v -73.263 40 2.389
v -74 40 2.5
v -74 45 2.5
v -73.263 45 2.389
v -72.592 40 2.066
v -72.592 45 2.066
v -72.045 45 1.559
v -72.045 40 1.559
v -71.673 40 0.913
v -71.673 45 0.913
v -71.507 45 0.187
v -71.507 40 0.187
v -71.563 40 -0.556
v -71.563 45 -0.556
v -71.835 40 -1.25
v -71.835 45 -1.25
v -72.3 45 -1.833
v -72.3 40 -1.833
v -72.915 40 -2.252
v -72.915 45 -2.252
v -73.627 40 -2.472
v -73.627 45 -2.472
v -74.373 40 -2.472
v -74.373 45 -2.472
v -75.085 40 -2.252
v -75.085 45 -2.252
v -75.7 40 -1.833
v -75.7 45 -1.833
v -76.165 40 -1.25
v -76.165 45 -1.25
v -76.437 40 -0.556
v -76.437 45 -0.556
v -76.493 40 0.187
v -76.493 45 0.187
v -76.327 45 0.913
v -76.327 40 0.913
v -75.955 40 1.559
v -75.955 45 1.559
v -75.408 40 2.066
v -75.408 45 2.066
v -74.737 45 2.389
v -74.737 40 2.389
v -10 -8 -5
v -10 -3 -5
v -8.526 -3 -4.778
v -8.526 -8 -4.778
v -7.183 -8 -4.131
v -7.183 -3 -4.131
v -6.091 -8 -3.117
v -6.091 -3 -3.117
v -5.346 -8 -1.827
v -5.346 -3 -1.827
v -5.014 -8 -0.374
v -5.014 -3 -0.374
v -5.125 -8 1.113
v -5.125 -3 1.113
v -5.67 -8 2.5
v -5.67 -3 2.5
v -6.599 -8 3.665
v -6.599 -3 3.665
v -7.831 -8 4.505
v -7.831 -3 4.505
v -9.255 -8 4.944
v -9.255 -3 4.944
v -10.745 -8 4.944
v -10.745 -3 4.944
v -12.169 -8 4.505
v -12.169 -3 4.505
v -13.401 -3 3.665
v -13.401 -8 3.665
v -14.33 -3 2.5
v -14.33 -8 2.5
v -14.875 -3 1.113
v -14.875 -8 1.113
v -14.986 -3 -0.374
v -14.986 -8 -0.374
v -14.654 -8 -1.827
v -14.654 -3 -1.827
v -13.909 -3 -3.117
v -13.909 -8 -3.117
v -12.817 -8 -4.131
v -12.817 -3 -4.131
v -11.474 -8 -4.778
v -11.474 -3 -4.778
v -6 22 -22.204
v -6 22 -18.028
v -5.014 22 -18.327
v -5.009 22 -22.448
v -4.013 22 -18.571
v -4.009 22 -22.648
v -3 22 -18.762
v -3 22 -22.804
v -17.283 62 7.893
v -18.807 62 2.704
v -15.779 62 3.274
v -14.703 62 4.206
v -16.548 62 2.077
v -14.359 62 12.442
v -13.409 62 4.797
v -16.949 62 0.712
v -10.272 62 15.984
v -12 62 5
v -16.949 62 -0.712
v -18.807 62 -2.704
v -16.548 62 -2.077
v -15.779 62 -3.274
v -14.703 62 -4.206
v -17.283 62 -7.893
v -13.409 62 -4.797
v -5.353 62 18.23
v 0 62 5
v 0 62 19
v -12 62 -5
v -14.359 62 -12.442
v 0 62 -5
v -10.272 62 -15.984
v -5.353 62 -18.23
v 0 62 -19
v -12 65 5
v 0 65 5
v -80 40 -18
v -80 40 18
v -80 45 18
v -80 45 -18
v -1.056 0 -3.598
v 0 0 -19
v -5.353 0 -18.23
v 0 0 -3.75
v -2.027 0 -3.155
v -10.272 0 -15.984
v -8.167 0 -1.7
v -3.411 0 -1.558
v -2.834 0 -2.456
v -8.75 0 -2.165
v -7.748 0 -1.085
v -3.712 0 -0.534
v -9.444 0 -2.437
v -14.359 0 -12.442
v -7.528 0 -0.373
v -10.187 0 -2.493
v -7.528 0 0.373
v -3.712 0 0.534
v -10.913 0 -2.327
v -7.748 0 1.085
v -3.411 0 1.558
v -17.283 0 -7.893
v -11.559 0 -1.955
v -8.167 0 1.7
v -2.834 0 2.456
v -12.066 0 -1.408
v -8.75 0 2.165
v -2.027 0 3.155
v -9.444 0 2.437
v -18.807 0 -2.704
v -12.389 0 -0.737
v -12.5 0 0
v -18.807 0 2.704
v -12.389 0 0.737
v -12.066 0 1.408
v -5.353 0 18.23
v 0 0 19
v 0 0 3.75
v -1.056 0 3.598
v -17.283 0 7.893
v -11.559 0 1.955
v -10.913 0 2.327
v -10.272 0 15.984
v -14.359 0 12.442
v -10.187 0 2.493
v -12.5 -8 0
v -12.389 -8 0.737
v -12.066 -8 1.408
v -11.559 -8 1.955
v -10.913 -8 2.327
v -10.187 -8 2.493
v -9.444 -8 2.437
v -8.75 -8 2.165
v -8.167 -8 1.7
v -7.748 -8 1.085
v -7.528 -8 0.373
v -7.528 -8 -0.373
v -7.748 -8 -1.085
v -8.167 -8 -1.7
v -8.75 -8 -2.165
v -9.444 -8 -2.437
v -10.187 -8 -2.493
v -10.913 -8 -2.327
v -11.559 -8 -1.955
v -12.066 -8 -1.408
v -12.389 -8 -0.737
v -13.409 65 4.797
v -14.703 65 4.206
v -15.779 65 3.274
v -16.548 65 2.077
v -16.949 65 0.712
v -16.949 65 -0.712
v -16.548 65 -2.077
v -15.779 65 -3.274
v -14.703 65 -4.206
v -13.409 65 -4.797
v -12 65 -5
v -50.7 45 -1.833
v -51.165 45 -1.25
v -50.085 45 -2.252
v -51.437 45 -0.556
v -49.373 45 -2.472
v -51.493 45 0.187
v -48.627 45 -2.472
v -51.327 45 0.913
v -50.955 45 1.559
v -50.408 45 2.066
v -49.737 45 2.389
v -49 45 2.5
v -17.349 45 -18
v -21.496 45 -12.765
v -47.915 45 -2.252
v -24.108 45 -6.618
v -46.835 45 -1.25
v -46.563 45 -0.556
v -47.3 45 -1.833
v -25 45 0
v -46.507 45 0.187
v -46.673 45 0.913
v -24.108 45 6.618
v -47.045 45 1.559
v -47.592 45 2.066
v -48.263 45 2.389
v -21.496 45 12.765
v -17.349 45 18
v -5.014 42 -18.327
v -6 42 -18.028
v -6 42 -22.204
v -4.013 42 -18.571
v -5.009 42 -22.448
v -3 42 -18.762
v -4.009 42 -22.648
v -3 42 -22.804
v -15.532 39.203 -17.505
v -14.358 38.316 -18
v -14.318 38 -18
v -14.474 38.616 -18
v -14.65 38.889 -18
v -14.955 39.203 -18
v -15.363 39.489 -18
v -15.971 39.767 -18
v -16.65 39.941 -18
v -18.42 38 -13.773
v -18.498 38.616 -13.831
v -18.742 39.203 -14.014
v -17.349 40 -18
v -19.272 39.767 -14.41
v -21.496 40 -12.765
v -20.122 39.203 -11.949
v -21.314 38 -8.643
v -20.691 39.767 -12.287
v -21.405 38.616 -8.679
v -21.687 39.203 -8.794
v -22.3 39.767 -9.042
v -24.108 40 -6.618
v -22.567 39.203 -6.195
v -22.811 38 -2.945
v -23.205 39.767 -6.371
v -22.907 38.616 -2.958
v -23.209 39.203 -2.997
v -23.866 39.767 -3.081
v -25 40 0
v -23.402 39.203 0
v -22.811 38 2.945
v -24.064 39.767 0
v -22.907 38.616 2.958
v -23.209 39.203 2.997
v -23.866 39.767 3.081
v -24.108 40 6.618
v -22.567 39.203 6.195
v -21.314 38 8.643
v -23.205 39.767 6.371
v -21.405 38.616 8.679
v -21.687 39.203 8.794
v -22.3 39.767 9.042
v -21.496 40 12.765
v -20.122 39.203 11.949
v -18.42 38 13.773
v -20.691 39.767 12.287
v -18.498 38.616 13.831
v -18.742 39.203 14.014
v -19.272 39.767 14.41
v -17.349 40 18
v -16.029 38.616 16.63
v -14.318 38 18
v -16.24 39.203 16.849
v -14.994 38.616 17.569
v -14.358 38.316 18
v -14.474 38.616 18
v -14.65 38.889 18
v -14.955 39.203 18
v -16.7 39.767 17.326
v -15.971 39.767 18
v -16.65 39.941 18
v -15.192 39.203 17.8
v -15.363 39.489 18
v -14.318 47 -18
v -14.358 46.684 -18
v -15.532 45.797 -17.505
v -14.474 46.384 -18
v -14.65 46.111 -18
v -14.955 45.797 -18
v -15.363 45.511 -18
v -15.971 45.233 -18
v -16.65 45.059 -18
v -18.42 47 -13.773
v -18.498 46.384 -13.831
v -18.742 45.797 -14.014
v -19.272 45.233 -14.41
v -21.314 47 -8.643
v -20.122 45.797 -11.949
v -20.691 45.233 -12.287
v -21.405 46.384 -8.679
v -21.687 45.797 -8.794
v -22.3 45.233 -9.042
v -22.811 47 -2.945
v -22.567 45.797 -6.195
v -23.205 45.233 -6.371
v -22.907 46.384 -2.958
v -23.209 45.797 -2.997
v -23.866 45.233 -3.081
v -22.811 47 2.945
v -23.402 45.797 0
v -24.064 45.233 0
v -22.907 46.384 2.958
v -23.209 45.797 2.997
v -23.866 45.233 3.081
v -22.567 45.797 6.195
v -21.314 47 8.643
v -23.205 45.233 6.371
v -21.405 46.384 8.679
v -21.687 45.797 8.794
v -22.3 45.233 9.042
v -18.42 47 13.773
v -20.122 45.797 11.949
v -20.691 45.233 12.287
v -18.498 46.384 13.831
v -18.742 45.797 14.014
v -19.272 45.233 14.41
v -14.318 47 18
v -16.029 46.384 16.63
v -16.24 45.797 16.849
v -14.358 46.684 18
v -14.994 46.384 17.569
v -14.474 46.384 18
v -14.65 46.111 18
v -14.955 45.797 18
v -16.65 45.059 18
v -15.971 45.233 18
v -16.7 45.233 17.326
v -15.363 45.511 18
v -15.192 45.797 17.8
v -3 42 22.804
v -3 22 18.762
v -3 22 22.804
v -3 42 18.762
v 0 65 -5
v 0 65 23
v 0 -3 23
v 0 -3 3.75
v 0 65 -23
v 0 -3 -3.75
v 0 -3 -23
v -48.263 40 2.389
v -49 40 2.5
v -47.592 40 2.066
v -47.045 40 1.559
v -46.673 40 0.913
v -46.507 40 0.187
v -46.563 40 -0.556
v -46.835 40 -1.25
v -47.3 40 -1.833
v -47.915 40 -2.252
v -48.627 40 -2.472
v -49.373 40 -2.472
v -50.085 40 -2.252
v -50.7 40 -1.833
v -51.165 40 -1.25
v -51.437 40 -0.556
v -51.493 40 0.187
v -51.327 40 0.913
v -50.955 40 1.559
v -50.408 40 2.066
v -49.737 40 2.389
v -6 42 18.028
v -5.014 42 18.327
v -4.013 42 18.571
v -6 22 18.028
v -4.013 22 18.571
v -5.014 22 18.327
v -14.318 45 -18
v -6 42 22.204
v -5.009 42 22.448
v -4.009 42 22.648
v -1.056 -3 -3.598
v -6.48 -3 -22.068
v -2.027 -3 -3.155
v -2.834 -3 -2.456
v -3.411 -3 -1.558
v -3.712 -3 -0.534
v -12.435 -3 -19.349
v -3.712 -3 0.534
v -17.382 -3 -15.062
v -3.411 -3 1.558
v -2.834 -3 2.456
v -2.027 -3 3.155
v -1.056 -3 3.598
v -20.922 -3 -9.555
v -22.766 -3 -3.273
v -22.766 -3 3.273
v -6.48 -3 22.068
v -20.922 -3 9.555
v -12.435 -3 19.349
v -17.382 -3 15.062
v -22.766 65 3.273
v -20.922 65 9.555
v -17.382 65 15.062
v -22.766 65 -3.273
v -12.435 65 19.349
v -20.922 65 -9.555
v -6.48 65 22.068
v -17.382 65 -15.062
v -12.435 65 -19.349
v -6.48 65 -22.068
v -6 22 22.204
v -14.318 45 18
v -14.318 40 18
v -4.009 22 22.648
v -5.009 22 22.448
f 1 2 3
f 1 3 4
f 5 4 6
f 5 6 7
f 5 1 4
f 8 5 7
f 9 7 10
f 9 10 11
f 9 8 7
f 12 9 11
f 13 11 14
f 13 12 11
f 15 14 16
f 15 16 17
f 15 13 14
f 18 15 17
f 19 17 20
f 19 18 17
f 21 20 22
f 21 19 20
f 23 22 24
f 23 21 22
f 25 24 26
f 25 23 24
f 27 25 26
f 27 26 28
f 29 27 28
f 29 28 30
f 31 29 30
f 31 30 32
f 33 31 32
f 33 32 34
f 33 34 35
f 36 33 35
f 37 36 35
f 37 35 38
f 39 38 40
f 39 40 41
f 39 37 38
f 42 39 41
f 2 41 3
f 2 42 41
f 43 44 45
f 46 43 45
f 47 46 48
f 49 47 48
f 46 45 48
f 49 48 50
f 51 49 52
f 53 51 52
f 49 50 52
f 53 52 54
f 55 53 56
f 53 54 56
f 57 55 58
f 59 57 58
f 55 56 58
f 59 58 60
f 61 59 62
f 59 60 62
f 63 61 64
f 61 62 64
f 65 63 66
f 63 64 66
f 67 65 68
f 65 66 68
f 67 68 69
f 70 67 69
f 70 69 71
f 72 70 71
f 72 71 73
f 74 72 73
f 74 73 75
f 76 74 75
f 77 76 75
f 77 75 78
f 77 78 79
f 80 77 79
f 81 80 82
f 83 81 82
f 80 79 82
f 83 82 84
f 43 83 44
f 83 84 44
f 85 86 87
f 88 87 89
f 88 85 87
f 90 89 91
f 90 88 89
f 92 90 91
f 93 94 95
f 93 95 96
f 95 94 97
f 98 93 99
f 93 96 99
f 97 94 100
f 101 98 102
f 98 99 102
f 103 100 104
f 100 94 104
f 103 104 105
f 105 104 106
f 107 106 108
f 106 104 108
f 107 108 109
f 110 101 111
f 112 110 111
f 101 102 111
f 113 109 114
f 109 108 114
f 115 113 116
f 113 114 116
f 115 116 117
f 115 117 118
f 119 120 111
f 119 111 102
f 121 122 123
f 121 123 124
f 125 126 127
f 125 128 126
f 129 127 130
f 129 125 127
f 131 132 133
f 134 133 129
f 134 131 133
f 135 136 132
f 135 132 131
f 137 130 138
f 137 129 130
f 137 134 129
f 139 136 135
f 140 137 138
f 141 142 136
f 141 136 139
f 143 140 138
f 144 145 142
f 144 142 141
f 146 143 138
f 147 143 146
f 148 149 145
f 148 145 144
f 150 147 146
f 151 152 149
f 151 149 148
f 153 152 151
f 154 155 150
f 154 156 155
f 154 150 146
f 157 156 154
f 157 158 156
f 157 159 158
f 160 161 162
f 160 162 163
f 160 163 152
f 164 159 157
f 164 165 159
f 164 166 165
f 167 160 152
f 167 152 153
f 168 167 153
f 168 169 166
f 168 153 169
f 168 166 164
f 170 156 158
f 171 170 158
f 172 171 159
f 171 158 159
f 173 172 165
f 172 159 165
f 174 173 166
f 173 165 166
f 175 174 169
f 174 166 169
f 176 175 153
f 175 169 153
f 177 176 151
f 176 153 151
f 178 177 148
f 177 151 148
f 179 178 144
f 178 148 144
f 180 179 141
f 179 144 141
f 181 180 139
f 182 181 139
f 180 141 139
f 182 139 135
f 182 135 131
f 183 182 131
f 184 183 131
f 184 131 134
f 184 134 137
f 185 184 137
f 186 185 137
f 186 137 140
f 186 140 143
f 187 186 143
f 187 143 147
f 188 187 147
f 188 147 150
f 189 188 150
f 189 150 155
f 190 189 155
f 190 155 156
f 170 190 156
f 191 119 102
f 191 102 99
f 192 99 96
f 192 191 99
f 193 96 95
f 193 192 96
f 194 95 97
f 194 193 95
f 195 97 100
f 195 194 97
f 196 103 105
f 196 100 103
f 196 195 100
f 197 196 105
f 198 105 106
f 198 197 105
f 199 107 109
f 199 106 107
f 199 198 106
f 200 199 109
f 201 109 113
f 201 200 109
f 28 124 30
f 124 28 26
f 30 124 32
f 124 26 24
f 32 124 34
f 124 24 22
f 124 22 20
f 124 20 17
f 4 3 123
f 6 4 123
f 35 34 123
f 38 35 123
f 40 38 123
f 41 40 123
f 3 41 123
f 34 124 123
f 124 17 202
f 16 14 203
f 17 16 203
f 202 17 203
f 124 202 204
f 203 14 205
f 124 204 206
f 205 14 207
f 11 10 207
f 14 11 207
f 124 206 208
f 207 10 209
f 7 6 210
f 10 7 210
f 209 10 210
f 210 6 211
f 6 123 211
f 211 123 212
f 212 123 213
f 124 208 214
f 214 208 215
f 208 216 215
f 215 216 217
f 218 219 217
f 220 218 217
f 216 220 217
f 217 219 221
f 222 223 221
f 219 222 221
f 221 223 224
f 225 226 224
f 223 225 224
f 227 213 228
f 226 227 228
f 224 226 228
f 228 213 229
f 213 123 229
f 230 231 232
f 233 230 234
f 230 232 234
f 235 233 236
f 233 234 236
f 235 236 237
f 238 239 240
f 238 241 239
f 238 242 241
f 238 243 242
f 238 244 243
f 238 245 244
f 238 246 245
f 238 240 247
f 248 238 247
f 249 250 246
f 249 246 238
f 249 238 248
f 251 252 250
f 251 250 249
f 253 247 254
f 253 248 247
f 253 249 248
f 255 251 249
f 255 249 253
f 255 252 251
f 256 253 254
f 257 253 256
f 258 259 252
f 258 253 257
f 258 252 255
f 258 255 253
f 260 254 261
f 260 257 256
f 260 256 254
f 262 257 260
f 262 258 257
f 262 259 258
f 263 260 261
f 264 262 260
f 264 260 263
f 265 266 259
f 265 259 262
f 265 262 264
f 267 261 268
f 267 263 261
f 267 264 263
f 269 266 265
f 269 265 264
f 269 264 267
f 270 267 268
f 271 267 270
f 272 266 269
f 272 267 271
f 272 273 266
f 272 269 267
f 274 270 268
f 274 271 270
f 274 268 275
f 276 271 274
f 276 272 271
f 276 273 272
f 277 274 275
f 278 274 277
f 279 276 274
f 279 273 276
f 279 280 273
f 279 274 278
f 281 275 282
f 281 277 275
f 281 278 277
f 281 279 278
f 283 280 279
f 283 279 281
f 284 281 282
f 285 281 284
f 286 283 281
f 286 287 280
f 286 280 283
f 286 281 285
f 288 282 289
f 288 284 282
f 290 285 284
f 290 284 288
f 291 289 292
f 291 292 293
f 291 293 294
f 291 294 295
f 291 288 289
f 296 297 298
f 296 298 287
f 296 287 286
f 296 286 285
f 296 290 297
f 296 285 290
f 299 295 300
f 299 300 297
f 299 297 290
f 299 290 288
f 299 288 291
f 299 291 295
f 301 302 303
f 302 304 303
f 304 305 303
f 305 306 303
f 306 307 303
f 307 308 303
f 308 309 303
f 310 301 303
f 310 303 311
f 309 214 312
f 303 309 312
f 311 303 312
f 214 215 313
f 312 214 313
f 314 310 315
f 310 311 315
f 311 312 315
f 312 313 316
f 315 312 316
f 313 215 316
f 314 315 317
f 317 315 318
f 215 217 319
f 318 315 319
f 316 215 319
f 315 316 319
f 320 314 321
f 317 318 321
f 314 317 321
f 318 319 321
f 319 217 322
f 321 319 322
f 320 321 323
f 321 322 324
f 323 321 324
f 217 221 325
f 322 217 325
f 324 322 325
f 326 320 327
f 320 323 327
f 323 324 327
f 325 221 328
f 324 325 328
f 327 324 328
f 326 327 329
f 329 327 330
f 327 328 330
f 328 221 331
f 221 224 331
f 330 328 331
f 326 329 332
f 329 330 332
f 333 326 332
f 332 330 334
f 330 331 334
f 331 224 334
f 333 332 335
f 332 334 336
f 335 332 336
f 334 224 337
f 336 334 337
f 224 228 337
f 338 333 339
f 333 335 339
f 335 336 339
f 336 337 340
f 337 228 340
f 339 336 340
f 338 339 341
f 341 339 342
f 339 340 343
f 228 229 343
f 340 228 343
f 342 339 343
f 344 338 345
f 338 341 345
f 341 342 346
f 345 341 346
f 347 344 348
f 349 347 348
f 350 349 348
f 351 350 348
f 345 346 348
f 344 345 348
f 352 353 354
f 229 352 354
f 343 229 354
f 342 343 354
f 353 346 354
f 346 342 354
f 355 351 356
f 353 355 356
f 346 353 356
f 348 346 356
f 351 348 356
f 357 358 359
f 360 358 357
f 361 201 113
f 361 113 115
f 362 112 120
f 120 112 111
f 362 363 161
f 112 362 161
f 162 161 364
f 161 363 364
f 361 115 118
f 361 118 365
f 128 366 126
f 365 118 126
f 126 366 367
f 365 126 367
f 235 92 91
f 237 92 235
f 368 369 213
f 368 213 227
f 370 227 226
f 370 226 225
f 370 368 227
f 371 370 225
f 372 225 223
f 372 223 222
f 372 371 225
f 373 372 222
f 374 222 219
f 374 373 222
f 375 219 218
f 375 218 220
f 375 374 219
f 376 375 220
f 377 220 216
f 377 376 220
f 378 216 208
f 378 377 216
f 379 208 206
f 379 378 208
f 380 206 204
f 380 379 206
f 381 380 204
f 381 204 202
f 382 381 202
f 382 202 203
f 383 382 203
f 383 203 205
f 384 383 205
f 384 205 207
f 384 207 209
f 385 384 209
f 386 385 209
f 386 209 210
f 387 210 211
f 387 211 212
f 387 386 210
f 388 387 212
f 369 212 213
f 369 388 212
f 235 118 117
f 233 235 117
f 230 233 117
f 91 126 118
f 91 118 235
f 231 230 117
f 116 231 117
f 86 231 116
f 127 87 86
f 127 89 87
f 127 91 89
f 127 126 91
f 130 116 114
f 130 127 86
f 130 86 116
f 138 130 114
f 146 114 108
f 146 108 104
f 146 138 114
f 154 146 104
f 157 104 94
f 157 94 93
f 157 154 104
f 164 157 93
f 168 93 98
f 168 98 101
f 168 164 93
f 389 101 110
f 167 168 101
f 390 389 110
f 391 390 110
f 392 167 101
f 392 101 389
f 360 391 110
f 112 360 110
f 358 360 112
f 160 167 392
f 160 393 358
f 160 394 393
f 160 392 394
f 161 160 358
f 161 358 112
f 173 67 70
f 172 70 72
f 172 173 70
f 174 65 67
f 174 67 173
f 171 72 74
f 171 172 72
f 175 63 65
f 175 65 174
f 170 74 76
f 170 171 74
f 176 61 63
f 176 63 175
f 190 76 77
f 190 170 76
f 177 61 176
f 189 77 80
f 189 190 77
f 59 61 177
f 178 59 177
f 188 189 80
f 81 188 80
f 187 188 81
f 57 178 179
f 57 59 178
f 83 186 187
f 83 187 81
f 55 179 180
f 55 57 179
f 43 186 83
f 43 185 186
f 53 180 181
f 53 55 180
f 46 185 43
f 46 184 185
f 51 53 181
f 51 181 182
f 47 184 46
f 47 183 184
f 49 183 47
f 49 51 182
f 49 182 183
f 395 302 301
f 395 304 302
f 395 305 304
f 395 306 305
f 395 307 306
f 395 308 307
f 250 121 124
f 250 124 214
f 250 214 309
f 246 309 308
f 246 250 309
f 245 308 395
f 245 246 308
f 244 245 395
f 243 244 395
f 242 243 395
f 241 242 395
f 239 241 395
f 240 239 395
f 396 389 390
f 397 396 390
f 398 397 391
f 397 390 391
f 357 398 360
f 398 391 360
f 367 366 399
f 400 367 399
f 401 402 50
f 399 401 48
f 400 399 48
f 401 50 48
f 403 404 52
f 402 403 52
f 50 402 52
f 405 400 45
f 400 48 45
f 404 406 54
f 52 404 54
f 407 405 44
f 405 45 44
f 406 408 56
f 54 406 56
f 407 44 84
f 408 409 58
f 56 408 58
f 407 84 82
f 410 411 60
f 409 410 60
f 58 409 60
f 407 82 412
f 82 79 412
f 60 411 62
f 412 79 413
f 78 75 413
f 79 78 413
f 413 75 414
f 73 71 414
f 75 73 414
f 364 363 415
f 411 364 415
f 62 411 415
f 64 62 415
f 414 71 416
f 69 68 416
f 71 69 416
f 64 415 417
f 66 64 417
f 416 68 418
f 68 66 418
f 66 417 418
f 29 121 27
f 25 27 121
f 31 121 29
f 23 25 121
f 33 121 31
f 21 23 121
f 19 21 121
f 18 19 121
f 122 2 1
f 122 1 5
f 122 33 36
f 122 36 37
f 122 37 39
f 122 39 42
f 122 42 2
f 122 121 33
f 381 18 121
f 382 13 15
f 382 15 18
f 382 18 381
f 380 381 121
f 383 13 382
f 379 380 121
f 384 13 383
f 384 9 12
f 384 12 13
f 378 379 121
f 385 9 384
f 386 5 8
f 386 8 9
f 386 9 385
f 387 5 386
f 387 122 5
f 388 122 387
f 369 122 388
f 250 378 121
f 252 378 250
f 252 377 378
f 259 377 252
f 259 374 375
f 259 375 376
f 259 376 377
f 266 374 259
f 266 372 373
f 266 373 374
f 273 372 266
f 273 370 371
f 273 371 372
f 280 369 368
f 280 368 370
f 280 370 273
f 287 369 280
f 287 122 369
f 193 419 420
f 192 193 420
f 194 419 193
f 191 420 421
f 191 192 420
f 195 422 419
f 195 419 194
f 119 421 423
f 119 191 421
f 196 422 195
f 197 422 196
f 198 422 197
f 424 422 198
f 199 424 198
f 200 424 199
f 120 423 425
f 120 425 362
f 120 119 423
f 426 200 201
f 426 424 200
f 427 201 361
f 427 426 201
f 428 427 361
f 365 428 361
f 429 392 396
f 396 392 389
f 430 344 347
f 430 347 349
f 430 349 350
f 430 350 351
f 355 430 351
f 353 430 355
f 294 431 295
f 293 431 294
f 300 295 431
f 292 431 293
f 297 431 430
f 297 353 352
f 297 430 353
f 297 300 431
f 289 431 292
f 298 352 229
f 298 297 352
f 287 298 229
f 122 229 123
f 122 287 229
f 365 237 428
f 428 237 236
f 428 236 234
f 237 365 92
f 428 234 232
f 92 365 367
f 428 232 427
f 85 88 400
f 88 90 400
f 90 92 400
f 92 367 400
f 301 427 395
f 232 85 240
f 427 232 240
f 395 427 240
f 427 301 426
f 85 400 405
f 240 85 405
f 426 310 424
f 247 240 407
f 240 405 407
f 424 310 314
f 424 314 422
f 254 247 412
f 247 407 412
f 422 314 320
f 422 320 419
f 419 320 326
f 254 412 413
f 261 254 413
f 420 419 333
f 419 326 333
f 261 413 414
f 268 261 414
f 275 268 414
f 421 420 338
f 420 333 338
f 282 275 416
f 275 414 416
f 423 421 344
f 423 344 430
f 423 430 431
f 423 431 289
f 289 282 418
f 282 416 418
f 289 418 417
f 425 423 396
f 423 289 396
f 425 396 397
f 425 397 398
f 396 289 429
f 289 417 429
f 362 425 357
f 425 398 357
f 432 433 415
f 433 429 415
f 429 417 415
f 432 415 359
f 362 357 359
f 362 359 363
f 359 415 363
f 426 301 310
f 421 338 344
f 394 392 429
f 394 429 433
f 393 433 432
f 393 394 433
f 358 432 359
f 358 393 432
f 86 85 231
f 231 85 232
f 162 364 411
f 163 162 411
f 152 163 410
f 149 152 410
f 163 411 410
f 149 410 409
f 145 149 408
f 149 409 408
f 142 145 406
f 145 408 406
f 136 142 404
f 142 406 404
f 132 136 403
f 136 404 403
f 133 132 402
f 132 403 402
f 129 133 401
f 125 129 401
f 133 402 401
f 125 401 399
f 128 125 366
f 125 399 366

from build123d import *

# Parameters (mm, degrees)
BOSS_EXTRUDE1_DEPTH     = 62
BOSS_EXTRUDE2_START     = 3
BOSS_EXTRUDE2_DEPTH     = 3
SKETCH4_R               = 5
BOSS_EXTRUDE3_DEPTH     = 5
M6X1_0_TAPPED_HOLE1_D   = 5
CUT_EXTRUDE1_DEPTH      = 71.014284257
CUT_EXTRUDE1_DEPTH_BACK = 71.014284257
SKETCH8_W               = 3
SKETCH8_H               = 20
BOSS_EXTRUDE4_DEPTH     = 3
CUT_EXTRUDE2_REACH      = 81.919
SKETCH11_R              = 2.5
BOSS_EXTRUDE5_DEPTH     = 5
FILLET1_R               = 2


with BuildPart() as part:
    # Sketch1 → Boss-Extrude1 (new body)
    with BuildSketch(Plane(origin=(0, 0, 0), x_dir=(1, 0, 0), z_dir=(0, 1, 0))):
        with BuildLine():
            Line((0, 23), (0, 19))
            ThreePointArc((0, 19), (-19, 0), (0, -19))
            Line((0, -19), (0, -23))
            ThreePointArc((0, -23), (-23, 0), (0, 23))
        make_face()
    extrude(amount=BOSS_EXTRUDE1_DEPTH)

    # Sketch3 → Boss-Extrude2 (add)
    with BuildSketch(Plane.XZ.offset(BOSS_EXTRUDE2_START)):
        with BuildLine():
            Line((0, 23), (0, 3.75))
            ThreePointArc((0, 3.75), (-3.75, 0), (0, -3.75))
            Line((0, -3.75), (0, -23))
            ThreePointArc((0, -23), (-23, 0), (0, 23))
        make_face()
    extrude(amount=-BOSS_EXTRUDE2_DEPTH)

    # Sketch4 → Boss-Extrude3 (add)
    with BuildSketch(Plane.XZ.offset(3)):
        with Locations(Location((-10, 0, 0), (0, 0, 270))):
            Circle(SKETCH4_R)
    extrude(amount=BOSS_EXTRUDE3_DEPTH)

    # M6x1.0 Tapped Hole1 (through all)
    with Locations(Plane.XZ.offset(8)):
        with Locations((-10, 0)):
            Hole(M6X1_0_TAPPED_HOLE1_D / 2)

    # Sketch8 → Cut-Extrude1 (cut, two sides: drawn at the far end of the back side and taken through both)
    with BuildSketch(Plane.XY.offset(-CUT_EXTRUDE1_DEPTH_BACK)):
        with Locations((-4.5, 32)):
            Rectangle(SKETCH8_W, SKETCH8_H)
    extrude(amount=CUT_EXTRUDE1_DEPTH + CUT_EXTRUDE1_DEPTH_BACK, mode=Mode.SUBTRACT)

    # Sketch9 → Boss-Extrude4 (add)
    with BuildSketch(Plane(origin=(0, 62, 0), x_dir=(1, 0, 0), z_dir=(0, 1, 0))):
        with BuildLine():
            Line((0, -23), (0, 23))
            ThreePointArc((0, 23), (-23, 0), (0, -23))
        make_face()
    extrude(amount=BOSS_EXTRUDE4_DEPTH)

    # Sketch10 → Cut-Extrude2 (cut, up to next)
    with BuildSketch(Plane(origin=(0, 65, 0), x_dir=(1, 0, 0), z_dir=(0, 1, 0)), mode=Mode.PRIVATE) as cut_extrude2_sk1:
        with BuildLine():
            Line((0, -5), (-12, -5))
            ThreePointArc((-12, -5), (-17, 0), (-12, 5))
            Line((-12, 5), (0, 5))
            ThreePointArc((0, 5), (5, 0), (0, -5))
        make_face()
    cut_extrude2_tool1 = extrude(cut_extrude2_sk1.sketch, amount=-CUT_EXTRUDE2_REACH, mode=Mode.PRIVATE) & part.part
    add(cut_extrude2_tool1.solids().sort_by_distance((-6, 65, 0))[0], mode=Mode.SUBTRACT)

    # Sketch11 → Boss-Extrude5 (add)
    with BuildSketch(Plane(origin=(0, 40, 0), x_dir=(-1, 0, 0), z_dir=(0, 1, 0))):
        with BuildLine():
            Line((14.317821063, 18), (80, 18))
            Line((80, 18), (80, -18))
            Line((80, -18), (14.317821063, -18))
            ThreePointArc((14.317821063, -18), (23, 0), (14.317821063, 18))
        make_face()
        with Locations(Location((49, 0, 0), (0, 0, 90))):
            Circle(SKETCH11_R, mode=Mode.SUBTRACT)
        with Locations(Location((74, 0, 0), (0, 0, 90))):
            Circle(SKETCH11_R, mode=Mode.SUBTRACT)
    extrude(amount=BOSS_EXTRUDE5_DEPTH)

    # Fillet1
    fillet1_edges = [part.edges().sort_by_distance(p)[0] for p in [
        (-23, 40, 0),
        (-23, 45, 0),
    ]]
    fillet(fillet1_edges, radius=FILLET1_R)


solid = part.part
